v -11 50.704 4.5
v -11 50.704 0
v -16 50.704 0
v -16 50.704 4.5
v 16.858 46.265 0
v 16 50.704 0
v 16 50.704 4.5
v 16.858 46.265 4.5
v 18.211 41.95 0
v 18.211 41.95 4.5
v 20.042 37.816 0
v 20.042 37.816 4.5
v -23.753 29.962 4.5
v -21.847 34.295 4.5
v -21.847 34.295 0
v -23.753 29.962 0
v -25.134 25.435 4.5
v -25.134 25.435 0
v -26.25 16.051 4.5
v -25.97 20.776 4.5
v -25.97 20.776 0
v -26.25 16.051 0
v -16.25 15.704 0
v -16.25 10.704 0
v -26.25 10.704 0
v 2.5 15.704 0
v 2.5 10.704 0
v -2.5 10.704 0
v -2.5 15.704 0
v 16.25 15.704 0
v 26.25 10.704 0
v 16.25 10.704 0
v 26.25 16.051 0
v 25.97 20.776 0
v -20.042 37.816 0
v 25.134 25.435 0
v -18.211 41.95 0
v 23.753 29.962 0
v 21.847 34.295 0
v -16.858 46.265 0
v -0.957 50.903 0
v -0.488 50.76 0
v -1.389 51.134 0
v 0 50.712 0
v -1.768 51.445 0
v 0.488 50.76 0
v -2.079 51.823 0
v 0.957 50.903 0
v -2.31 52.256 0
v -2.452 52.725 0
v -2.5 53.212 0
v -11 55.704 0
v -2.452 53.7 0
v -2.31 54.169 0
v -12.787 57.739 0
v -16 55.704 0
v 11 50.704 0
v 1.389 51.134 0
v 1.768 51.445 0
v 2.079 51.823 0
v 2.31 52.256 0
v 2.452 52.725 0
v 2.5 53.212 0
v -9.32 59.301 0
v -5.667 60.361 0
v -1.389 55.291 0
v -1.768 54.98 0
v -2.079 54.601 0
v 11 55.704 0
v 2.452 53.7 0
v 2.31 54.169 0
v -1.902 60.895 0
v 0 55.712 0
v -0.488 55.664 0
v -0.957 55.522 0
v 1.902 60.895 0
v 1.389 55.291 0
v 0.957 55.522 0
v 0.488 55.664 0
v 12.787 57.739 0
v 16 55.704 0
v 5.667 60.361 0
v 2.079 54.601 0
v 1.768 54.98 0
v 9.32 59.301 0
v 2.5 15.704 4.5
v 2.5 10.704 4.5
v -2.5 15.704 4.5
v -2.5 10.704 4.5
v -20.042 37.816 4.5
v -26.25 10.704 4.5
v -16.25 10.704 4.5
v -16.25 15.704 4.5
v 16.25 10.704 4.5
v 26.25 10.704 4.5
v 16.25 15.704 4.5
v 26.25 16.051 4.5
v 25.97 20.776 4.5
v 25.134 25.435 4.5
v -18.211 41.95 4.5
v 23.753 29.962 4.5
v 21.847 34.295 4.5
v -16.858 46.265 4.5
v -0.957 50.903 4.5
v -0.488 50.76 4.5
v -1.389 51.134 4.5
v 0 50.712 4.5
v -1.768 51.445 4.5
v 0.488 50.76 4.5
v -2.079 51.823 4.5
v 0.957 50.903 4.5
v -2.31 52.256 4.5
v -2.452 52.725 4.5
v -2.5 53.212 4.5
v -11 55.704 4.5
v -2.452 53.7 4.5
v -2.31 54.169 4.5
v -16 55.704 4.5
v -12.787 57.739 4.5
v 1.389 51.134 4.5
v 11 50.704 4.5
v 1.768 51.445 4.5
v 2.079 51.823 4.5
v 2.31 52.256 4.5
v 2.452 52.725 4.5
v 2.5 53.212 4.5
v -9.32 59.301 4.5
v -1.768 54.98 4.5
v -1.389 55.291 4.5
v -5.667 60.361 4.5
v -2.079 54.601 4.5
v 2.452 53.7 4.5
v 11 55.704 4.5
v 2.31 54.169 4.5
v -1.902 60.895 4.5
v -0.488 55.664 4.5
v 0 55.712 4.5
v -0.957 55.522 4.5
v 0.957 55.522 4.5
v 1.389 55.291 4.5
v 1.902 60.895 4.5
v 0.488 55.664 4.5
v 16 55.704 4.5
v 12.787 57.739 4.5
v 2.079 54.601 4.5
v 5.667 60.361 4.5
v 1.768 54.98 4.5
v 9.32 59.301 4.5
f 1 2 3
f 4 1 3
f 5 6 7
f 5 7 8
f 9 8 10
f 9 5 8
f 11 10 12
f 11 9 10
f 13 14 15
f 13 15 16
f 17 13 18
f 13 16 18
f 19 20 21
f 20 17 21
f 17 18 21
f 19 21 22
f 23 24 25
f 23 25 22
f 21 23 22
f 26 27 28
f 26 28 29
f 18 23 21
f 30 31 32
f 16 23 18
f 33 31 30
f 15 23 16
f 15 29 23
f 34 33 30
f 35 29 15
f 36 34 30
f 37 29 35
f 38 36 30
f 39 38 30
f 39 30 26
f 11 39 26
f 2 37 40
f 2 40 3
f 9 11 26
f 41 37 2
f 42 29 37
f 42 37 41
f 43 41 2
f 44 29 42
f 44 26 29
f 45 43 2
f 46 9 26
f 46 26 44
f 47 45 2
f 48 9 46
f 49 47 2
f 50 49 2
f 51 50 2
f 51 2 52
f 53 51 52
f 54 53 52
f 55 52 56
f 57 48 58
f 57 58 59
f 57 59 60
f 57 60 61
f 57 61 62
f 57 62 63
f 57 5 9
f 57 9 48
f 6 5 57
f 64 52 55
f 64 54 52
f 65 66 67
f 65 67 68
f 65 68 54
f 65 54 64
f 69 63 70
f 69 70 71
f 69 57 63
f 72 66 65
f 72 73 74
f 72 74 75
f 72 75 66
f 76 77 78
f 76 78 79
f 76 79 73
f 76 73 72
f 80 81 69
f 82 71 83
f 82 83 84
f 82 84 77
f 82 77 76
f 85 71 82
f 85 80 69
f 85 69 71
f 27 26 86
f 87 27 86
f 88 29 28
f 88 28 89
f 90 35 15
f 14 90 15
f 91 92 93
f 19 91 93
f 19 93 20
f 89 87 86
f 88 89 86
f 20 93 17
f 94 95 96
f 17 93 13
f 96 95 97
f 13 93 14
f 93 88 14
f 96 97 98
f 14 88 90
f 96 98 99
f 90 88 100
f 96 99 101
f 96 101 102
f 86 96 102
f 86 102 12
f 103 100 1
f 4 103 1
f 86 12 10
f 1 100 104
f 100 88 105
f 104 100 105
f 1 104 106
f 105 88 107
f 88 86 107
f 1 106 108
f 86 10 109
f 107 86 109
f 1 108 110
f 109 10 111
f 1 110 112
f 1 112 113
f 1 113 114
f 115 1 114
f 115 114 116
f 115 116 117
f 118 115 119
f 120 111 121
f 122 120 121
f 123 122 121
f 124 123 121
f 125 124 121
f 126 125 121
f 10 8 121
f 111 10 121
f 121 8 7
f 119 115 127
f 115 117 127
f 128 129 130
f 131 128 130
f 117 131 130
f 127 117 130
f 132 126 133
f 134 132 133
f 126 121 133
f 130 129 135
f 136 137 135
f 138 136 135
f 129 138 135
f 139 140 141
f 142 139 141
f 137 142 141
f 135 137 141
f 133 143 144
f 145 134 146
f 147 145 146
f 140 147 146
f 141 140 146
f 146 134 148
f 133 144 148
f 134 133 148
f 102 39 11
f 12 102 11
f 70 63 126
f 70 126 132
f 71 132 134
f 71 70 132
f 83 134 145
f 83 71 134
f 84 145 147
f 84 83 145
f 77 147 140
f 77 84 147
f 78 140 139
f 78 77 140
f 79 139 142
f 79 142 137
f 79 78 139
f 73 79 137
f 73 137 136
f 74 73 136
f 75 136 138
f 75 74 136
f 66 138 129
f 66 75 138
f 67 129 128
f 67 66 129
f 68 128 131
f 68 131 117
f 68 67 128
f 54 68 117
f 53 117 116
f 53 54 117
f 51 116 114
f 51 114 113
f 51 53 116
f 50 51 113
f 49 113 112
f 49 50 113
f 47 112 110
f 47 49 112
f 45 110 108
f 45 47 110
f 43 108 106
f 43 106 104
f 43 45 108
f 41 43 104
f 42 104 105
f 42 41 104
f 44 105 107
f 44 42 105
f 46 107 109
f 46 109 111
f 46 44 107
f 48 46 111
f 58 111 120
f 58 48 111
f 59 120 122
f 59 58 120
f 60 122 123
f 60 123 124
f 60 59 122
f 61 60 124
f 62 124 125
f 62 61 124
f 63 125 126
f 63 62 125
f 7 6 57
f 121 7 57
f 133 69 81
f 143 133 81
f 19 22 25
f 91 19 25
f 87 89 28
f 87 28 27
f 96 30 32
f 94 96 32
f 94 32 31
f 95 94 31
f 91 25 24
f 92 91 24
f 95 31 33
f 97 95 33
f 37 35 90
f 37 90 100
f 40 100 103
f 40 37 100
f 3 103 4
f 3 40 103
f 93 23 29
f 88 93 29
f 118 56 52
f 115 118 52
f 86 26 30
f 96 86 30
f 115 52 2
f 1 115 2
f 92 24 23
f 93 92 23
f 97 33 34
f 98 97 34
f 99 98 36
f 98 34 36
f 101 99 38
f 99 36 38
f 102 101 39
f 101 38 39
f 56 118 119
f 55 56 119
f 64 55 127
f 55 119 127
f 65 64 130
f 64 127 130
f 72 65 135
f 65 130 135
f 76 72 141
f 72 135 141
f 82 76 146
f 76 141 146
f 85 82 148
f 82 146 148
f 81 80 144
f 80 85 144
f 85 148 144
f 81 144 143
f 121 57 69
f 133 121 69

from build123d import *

# Parameters (mm, degrees)
SKETCH1_R           = 2.5
BOSS_EXTRUDE1_DEPTH = 4.5
FILLET1_R           = 40
SKETCH2_W           = 5
SKETCH2_H           = 4.5
BOSS_EXTRUDE2_DEPTH = 5
CHAMFER1_SIZE       = 6
FILLET2_R           = 30
CUT_EXTRUDE1_DEPTH  = 10


# Some blends are built 0.0001 mm under size
with BuildPart() as part:
    # Sketch1 → Boss-Extrude1 (new body)
    with BuildSketch(Plane.XY):
        Polygon((-16.25, 10.704231142), (-16.25, 15.704231142), (16.25, 15.704231142), (16.25, 10.704231142), (26.25, 10.704231142), (26.25, 25.704231142), (16, 45.704231142), (16, 50.704231142), (11, 50.704231142), (11, 55.704231142), (16, 55.704231142), (16, 61.704231142), (-16, 61.704231142), (-16, 55.704231142), (-11, 55.704231142), (-11, 50.704231142), (-16, 50.704231142), (-16, 45.704231142), (-26.25, 25.704231142), (-26.25, 10.704231142), align=None)
        with Locations((0, 53.212370659)):
            Circle(SKETCH1_R, mode=Mode.SUBTRACT)
    extrude(amount=BOSS_EXTRUDE1_DEPTH)

    # Fillet1
    # the kernel refuses this fillet: 40 mm, written as the material it adds along each edge
    with BuildSketch(Plane(origin=(-16, 45.704231142, 0), x_dir=(0, 1, 0), z_dir=(0, 0, 1))) as fillet1_piece_1:
        with BuildLine():
            CenterArc((10.355860331, 39.639812816), FILLET1_R, 242.864860378, 19.440324463)
            Line((-7.887771306, 4.042482794), (0, 0))
            Line((0, 0), (5, 0))
        make_face()
    extrude(amount=4.5)
    with BuildSketch(Plane(origin=(16, 45.704231142, 0), x_dir=(0.4560907909103989, -0.8899332505568757, 0), z_dir=(0, 0, 1))) as fillet1_piece_2:
        with BuildLine():
            CenterArc((8.863329132, 40), FILLET1_R, 250.559675537, 19.440324463)
            Line((-4.449666253, 2.280453955), (0, 0))
            Line((0, 0), (8.863329132, 0))
        make_face()
    extrude(amount=4.5)
    # the kernel refuses this fillet: 40 mm, written as the material it takes off along each edge
    with BuildSketch(Plane(origin=(-26.25, 25.704231142, -24.132640175), x_dir=(0, -1, 0), z_dir=(0, 0, 1))) as fillet1_2_piece_1:
        with BuildLine():
            CenterArc((FILLET1_R * 0.241326401753, FILLET1_R), FILLET1_R, 242.864860378, 27.135139622)
            Line((-FILLET1_R * 0.214764389157, FILLET1_R * 0.110066749443), (0, 0))
            Line((0, 0), (FILLET1_R * 0.241326401753, 0))
        make_face()
    extrude(amount=52.765280351, mode=Mode.SUBTRACT)
    with BuildSketch(Plane(origin=(26.25, 25.704231142, -24.132640175), x_dir=(0, -1, 0), z_dir=(0, 0, 1))) as fillet1_2_piece_2:
        with BuildLine():
            CenterArc((FILLET1_R * 0.241326401753, -FILLET1_R), FILLET1_R, 90, 27.135139622)
            Line((-FILLET1_R * 0.214764389157, -FILLET1_R * 0.110066749443), (0, 0))
            Line((0, 0), (FILLET1_R * 0.241326401753, 0))
        make_face()
    extrude(amount=52.765280351, mode=Mode.SUBTRACT)

    # Sketch2 → Boss-Extrude2 (add)
    with BuildSketch(Plane.XZ.offset(-15.704231142)):
        with Locations((0, 2.25)):
            Rectangle(SKETCH2_W, SKETCH2_H)
    extrude(amount=BOSS_EXTRUDE2_DEPTH)

    # Chamfer1
    chamfer1_edges = [part.edges().sort_by_distance(p)[0] for p in [
        (16, 61.704231142, 2.25),
        (-16, 61.704231142, 2.25),
    ]]
    chamfer(chamfer1_edges, length=CHAMFER1_SIZE - 0.0001)  # a hair under: the kernel refuses the full size

    # Fillet2
    # the kernel refuses this fillet: 30 mm, written as the material it takes off along each edge
    with BuildSketch(Plane(origin=(10.0001, 61.704231142, -29.999916665), x_dir=(-1, 0, 0), z_dir=(0, 0, 1))) as fillet2_piece_1:
        with BuildLine():
            CenterArc((11.999966666, 30), FILLET2_R, 233.130420665, 36.869579335)
            Line((-5.9999, 5.9999), (-6.359897333, 5.519898))
            ThreePointArc((-6.359897333, 5.519898), (-3.424214069, 2.575685931), (-0.424264069, -0.424264069))
            Line((-0.424264069, -0.424264069), (0, -0.6))
            Line((0, -0.6), (11.999966666, -0.6))
            Line((11.999966666, -0.6), (11.999966666, 0))
        make_face()
    extrude(amount=64.499833329, mode=Mode.SUBTRACT)
    with BuildSketch(Plane(origin=(-10.0001, 61.704231142, -29.999916665), x_dir=(-0.7071067811865477, -0.7071067811865472, 0), z_dir=(0, 0, 1))) as fillet2_piece_2:
        with BuildLine():
            CenterArc((12.727945632, 29.698461239), FILLET2_R, 225, 36.869579335)
            Line((-8.485257803, 8.485257803), (-8.909521872, 8.060993735))
            Line((-8.909521872, 8.060993735), (-0.424264069, -0.424264069))
            Line((-0.424264069, -0.424264069), (0, -0.6))
            ThreePointArc((0, -0.6), (4.242569976, -0.6), (8.400283839, -0.593969225))
            Line((8.400283839, -0.593969225), (8.485139953, 0))
        make_face()
    extrude(amount=64.499833329, mode=Mode.SUBTRACT)

    # Sketch3 → Cut-Extrude1 (cut)
    with BuildSketch(Plane.XY.offset(4.5)):
        with BuildLine():
            ThreePointArc((-16, 55.704231142), (0, 60.96256169), (16, 55.704231142))
            ThreePointArc((16, 55.704231142), (0, 69.243827032), (-16, 55.704231142))
        make_face()
    extrude(amount=-CUT_EXTRUDE1_DEPTH, mode=Mode.SUBTRACT)


solid = part.part
